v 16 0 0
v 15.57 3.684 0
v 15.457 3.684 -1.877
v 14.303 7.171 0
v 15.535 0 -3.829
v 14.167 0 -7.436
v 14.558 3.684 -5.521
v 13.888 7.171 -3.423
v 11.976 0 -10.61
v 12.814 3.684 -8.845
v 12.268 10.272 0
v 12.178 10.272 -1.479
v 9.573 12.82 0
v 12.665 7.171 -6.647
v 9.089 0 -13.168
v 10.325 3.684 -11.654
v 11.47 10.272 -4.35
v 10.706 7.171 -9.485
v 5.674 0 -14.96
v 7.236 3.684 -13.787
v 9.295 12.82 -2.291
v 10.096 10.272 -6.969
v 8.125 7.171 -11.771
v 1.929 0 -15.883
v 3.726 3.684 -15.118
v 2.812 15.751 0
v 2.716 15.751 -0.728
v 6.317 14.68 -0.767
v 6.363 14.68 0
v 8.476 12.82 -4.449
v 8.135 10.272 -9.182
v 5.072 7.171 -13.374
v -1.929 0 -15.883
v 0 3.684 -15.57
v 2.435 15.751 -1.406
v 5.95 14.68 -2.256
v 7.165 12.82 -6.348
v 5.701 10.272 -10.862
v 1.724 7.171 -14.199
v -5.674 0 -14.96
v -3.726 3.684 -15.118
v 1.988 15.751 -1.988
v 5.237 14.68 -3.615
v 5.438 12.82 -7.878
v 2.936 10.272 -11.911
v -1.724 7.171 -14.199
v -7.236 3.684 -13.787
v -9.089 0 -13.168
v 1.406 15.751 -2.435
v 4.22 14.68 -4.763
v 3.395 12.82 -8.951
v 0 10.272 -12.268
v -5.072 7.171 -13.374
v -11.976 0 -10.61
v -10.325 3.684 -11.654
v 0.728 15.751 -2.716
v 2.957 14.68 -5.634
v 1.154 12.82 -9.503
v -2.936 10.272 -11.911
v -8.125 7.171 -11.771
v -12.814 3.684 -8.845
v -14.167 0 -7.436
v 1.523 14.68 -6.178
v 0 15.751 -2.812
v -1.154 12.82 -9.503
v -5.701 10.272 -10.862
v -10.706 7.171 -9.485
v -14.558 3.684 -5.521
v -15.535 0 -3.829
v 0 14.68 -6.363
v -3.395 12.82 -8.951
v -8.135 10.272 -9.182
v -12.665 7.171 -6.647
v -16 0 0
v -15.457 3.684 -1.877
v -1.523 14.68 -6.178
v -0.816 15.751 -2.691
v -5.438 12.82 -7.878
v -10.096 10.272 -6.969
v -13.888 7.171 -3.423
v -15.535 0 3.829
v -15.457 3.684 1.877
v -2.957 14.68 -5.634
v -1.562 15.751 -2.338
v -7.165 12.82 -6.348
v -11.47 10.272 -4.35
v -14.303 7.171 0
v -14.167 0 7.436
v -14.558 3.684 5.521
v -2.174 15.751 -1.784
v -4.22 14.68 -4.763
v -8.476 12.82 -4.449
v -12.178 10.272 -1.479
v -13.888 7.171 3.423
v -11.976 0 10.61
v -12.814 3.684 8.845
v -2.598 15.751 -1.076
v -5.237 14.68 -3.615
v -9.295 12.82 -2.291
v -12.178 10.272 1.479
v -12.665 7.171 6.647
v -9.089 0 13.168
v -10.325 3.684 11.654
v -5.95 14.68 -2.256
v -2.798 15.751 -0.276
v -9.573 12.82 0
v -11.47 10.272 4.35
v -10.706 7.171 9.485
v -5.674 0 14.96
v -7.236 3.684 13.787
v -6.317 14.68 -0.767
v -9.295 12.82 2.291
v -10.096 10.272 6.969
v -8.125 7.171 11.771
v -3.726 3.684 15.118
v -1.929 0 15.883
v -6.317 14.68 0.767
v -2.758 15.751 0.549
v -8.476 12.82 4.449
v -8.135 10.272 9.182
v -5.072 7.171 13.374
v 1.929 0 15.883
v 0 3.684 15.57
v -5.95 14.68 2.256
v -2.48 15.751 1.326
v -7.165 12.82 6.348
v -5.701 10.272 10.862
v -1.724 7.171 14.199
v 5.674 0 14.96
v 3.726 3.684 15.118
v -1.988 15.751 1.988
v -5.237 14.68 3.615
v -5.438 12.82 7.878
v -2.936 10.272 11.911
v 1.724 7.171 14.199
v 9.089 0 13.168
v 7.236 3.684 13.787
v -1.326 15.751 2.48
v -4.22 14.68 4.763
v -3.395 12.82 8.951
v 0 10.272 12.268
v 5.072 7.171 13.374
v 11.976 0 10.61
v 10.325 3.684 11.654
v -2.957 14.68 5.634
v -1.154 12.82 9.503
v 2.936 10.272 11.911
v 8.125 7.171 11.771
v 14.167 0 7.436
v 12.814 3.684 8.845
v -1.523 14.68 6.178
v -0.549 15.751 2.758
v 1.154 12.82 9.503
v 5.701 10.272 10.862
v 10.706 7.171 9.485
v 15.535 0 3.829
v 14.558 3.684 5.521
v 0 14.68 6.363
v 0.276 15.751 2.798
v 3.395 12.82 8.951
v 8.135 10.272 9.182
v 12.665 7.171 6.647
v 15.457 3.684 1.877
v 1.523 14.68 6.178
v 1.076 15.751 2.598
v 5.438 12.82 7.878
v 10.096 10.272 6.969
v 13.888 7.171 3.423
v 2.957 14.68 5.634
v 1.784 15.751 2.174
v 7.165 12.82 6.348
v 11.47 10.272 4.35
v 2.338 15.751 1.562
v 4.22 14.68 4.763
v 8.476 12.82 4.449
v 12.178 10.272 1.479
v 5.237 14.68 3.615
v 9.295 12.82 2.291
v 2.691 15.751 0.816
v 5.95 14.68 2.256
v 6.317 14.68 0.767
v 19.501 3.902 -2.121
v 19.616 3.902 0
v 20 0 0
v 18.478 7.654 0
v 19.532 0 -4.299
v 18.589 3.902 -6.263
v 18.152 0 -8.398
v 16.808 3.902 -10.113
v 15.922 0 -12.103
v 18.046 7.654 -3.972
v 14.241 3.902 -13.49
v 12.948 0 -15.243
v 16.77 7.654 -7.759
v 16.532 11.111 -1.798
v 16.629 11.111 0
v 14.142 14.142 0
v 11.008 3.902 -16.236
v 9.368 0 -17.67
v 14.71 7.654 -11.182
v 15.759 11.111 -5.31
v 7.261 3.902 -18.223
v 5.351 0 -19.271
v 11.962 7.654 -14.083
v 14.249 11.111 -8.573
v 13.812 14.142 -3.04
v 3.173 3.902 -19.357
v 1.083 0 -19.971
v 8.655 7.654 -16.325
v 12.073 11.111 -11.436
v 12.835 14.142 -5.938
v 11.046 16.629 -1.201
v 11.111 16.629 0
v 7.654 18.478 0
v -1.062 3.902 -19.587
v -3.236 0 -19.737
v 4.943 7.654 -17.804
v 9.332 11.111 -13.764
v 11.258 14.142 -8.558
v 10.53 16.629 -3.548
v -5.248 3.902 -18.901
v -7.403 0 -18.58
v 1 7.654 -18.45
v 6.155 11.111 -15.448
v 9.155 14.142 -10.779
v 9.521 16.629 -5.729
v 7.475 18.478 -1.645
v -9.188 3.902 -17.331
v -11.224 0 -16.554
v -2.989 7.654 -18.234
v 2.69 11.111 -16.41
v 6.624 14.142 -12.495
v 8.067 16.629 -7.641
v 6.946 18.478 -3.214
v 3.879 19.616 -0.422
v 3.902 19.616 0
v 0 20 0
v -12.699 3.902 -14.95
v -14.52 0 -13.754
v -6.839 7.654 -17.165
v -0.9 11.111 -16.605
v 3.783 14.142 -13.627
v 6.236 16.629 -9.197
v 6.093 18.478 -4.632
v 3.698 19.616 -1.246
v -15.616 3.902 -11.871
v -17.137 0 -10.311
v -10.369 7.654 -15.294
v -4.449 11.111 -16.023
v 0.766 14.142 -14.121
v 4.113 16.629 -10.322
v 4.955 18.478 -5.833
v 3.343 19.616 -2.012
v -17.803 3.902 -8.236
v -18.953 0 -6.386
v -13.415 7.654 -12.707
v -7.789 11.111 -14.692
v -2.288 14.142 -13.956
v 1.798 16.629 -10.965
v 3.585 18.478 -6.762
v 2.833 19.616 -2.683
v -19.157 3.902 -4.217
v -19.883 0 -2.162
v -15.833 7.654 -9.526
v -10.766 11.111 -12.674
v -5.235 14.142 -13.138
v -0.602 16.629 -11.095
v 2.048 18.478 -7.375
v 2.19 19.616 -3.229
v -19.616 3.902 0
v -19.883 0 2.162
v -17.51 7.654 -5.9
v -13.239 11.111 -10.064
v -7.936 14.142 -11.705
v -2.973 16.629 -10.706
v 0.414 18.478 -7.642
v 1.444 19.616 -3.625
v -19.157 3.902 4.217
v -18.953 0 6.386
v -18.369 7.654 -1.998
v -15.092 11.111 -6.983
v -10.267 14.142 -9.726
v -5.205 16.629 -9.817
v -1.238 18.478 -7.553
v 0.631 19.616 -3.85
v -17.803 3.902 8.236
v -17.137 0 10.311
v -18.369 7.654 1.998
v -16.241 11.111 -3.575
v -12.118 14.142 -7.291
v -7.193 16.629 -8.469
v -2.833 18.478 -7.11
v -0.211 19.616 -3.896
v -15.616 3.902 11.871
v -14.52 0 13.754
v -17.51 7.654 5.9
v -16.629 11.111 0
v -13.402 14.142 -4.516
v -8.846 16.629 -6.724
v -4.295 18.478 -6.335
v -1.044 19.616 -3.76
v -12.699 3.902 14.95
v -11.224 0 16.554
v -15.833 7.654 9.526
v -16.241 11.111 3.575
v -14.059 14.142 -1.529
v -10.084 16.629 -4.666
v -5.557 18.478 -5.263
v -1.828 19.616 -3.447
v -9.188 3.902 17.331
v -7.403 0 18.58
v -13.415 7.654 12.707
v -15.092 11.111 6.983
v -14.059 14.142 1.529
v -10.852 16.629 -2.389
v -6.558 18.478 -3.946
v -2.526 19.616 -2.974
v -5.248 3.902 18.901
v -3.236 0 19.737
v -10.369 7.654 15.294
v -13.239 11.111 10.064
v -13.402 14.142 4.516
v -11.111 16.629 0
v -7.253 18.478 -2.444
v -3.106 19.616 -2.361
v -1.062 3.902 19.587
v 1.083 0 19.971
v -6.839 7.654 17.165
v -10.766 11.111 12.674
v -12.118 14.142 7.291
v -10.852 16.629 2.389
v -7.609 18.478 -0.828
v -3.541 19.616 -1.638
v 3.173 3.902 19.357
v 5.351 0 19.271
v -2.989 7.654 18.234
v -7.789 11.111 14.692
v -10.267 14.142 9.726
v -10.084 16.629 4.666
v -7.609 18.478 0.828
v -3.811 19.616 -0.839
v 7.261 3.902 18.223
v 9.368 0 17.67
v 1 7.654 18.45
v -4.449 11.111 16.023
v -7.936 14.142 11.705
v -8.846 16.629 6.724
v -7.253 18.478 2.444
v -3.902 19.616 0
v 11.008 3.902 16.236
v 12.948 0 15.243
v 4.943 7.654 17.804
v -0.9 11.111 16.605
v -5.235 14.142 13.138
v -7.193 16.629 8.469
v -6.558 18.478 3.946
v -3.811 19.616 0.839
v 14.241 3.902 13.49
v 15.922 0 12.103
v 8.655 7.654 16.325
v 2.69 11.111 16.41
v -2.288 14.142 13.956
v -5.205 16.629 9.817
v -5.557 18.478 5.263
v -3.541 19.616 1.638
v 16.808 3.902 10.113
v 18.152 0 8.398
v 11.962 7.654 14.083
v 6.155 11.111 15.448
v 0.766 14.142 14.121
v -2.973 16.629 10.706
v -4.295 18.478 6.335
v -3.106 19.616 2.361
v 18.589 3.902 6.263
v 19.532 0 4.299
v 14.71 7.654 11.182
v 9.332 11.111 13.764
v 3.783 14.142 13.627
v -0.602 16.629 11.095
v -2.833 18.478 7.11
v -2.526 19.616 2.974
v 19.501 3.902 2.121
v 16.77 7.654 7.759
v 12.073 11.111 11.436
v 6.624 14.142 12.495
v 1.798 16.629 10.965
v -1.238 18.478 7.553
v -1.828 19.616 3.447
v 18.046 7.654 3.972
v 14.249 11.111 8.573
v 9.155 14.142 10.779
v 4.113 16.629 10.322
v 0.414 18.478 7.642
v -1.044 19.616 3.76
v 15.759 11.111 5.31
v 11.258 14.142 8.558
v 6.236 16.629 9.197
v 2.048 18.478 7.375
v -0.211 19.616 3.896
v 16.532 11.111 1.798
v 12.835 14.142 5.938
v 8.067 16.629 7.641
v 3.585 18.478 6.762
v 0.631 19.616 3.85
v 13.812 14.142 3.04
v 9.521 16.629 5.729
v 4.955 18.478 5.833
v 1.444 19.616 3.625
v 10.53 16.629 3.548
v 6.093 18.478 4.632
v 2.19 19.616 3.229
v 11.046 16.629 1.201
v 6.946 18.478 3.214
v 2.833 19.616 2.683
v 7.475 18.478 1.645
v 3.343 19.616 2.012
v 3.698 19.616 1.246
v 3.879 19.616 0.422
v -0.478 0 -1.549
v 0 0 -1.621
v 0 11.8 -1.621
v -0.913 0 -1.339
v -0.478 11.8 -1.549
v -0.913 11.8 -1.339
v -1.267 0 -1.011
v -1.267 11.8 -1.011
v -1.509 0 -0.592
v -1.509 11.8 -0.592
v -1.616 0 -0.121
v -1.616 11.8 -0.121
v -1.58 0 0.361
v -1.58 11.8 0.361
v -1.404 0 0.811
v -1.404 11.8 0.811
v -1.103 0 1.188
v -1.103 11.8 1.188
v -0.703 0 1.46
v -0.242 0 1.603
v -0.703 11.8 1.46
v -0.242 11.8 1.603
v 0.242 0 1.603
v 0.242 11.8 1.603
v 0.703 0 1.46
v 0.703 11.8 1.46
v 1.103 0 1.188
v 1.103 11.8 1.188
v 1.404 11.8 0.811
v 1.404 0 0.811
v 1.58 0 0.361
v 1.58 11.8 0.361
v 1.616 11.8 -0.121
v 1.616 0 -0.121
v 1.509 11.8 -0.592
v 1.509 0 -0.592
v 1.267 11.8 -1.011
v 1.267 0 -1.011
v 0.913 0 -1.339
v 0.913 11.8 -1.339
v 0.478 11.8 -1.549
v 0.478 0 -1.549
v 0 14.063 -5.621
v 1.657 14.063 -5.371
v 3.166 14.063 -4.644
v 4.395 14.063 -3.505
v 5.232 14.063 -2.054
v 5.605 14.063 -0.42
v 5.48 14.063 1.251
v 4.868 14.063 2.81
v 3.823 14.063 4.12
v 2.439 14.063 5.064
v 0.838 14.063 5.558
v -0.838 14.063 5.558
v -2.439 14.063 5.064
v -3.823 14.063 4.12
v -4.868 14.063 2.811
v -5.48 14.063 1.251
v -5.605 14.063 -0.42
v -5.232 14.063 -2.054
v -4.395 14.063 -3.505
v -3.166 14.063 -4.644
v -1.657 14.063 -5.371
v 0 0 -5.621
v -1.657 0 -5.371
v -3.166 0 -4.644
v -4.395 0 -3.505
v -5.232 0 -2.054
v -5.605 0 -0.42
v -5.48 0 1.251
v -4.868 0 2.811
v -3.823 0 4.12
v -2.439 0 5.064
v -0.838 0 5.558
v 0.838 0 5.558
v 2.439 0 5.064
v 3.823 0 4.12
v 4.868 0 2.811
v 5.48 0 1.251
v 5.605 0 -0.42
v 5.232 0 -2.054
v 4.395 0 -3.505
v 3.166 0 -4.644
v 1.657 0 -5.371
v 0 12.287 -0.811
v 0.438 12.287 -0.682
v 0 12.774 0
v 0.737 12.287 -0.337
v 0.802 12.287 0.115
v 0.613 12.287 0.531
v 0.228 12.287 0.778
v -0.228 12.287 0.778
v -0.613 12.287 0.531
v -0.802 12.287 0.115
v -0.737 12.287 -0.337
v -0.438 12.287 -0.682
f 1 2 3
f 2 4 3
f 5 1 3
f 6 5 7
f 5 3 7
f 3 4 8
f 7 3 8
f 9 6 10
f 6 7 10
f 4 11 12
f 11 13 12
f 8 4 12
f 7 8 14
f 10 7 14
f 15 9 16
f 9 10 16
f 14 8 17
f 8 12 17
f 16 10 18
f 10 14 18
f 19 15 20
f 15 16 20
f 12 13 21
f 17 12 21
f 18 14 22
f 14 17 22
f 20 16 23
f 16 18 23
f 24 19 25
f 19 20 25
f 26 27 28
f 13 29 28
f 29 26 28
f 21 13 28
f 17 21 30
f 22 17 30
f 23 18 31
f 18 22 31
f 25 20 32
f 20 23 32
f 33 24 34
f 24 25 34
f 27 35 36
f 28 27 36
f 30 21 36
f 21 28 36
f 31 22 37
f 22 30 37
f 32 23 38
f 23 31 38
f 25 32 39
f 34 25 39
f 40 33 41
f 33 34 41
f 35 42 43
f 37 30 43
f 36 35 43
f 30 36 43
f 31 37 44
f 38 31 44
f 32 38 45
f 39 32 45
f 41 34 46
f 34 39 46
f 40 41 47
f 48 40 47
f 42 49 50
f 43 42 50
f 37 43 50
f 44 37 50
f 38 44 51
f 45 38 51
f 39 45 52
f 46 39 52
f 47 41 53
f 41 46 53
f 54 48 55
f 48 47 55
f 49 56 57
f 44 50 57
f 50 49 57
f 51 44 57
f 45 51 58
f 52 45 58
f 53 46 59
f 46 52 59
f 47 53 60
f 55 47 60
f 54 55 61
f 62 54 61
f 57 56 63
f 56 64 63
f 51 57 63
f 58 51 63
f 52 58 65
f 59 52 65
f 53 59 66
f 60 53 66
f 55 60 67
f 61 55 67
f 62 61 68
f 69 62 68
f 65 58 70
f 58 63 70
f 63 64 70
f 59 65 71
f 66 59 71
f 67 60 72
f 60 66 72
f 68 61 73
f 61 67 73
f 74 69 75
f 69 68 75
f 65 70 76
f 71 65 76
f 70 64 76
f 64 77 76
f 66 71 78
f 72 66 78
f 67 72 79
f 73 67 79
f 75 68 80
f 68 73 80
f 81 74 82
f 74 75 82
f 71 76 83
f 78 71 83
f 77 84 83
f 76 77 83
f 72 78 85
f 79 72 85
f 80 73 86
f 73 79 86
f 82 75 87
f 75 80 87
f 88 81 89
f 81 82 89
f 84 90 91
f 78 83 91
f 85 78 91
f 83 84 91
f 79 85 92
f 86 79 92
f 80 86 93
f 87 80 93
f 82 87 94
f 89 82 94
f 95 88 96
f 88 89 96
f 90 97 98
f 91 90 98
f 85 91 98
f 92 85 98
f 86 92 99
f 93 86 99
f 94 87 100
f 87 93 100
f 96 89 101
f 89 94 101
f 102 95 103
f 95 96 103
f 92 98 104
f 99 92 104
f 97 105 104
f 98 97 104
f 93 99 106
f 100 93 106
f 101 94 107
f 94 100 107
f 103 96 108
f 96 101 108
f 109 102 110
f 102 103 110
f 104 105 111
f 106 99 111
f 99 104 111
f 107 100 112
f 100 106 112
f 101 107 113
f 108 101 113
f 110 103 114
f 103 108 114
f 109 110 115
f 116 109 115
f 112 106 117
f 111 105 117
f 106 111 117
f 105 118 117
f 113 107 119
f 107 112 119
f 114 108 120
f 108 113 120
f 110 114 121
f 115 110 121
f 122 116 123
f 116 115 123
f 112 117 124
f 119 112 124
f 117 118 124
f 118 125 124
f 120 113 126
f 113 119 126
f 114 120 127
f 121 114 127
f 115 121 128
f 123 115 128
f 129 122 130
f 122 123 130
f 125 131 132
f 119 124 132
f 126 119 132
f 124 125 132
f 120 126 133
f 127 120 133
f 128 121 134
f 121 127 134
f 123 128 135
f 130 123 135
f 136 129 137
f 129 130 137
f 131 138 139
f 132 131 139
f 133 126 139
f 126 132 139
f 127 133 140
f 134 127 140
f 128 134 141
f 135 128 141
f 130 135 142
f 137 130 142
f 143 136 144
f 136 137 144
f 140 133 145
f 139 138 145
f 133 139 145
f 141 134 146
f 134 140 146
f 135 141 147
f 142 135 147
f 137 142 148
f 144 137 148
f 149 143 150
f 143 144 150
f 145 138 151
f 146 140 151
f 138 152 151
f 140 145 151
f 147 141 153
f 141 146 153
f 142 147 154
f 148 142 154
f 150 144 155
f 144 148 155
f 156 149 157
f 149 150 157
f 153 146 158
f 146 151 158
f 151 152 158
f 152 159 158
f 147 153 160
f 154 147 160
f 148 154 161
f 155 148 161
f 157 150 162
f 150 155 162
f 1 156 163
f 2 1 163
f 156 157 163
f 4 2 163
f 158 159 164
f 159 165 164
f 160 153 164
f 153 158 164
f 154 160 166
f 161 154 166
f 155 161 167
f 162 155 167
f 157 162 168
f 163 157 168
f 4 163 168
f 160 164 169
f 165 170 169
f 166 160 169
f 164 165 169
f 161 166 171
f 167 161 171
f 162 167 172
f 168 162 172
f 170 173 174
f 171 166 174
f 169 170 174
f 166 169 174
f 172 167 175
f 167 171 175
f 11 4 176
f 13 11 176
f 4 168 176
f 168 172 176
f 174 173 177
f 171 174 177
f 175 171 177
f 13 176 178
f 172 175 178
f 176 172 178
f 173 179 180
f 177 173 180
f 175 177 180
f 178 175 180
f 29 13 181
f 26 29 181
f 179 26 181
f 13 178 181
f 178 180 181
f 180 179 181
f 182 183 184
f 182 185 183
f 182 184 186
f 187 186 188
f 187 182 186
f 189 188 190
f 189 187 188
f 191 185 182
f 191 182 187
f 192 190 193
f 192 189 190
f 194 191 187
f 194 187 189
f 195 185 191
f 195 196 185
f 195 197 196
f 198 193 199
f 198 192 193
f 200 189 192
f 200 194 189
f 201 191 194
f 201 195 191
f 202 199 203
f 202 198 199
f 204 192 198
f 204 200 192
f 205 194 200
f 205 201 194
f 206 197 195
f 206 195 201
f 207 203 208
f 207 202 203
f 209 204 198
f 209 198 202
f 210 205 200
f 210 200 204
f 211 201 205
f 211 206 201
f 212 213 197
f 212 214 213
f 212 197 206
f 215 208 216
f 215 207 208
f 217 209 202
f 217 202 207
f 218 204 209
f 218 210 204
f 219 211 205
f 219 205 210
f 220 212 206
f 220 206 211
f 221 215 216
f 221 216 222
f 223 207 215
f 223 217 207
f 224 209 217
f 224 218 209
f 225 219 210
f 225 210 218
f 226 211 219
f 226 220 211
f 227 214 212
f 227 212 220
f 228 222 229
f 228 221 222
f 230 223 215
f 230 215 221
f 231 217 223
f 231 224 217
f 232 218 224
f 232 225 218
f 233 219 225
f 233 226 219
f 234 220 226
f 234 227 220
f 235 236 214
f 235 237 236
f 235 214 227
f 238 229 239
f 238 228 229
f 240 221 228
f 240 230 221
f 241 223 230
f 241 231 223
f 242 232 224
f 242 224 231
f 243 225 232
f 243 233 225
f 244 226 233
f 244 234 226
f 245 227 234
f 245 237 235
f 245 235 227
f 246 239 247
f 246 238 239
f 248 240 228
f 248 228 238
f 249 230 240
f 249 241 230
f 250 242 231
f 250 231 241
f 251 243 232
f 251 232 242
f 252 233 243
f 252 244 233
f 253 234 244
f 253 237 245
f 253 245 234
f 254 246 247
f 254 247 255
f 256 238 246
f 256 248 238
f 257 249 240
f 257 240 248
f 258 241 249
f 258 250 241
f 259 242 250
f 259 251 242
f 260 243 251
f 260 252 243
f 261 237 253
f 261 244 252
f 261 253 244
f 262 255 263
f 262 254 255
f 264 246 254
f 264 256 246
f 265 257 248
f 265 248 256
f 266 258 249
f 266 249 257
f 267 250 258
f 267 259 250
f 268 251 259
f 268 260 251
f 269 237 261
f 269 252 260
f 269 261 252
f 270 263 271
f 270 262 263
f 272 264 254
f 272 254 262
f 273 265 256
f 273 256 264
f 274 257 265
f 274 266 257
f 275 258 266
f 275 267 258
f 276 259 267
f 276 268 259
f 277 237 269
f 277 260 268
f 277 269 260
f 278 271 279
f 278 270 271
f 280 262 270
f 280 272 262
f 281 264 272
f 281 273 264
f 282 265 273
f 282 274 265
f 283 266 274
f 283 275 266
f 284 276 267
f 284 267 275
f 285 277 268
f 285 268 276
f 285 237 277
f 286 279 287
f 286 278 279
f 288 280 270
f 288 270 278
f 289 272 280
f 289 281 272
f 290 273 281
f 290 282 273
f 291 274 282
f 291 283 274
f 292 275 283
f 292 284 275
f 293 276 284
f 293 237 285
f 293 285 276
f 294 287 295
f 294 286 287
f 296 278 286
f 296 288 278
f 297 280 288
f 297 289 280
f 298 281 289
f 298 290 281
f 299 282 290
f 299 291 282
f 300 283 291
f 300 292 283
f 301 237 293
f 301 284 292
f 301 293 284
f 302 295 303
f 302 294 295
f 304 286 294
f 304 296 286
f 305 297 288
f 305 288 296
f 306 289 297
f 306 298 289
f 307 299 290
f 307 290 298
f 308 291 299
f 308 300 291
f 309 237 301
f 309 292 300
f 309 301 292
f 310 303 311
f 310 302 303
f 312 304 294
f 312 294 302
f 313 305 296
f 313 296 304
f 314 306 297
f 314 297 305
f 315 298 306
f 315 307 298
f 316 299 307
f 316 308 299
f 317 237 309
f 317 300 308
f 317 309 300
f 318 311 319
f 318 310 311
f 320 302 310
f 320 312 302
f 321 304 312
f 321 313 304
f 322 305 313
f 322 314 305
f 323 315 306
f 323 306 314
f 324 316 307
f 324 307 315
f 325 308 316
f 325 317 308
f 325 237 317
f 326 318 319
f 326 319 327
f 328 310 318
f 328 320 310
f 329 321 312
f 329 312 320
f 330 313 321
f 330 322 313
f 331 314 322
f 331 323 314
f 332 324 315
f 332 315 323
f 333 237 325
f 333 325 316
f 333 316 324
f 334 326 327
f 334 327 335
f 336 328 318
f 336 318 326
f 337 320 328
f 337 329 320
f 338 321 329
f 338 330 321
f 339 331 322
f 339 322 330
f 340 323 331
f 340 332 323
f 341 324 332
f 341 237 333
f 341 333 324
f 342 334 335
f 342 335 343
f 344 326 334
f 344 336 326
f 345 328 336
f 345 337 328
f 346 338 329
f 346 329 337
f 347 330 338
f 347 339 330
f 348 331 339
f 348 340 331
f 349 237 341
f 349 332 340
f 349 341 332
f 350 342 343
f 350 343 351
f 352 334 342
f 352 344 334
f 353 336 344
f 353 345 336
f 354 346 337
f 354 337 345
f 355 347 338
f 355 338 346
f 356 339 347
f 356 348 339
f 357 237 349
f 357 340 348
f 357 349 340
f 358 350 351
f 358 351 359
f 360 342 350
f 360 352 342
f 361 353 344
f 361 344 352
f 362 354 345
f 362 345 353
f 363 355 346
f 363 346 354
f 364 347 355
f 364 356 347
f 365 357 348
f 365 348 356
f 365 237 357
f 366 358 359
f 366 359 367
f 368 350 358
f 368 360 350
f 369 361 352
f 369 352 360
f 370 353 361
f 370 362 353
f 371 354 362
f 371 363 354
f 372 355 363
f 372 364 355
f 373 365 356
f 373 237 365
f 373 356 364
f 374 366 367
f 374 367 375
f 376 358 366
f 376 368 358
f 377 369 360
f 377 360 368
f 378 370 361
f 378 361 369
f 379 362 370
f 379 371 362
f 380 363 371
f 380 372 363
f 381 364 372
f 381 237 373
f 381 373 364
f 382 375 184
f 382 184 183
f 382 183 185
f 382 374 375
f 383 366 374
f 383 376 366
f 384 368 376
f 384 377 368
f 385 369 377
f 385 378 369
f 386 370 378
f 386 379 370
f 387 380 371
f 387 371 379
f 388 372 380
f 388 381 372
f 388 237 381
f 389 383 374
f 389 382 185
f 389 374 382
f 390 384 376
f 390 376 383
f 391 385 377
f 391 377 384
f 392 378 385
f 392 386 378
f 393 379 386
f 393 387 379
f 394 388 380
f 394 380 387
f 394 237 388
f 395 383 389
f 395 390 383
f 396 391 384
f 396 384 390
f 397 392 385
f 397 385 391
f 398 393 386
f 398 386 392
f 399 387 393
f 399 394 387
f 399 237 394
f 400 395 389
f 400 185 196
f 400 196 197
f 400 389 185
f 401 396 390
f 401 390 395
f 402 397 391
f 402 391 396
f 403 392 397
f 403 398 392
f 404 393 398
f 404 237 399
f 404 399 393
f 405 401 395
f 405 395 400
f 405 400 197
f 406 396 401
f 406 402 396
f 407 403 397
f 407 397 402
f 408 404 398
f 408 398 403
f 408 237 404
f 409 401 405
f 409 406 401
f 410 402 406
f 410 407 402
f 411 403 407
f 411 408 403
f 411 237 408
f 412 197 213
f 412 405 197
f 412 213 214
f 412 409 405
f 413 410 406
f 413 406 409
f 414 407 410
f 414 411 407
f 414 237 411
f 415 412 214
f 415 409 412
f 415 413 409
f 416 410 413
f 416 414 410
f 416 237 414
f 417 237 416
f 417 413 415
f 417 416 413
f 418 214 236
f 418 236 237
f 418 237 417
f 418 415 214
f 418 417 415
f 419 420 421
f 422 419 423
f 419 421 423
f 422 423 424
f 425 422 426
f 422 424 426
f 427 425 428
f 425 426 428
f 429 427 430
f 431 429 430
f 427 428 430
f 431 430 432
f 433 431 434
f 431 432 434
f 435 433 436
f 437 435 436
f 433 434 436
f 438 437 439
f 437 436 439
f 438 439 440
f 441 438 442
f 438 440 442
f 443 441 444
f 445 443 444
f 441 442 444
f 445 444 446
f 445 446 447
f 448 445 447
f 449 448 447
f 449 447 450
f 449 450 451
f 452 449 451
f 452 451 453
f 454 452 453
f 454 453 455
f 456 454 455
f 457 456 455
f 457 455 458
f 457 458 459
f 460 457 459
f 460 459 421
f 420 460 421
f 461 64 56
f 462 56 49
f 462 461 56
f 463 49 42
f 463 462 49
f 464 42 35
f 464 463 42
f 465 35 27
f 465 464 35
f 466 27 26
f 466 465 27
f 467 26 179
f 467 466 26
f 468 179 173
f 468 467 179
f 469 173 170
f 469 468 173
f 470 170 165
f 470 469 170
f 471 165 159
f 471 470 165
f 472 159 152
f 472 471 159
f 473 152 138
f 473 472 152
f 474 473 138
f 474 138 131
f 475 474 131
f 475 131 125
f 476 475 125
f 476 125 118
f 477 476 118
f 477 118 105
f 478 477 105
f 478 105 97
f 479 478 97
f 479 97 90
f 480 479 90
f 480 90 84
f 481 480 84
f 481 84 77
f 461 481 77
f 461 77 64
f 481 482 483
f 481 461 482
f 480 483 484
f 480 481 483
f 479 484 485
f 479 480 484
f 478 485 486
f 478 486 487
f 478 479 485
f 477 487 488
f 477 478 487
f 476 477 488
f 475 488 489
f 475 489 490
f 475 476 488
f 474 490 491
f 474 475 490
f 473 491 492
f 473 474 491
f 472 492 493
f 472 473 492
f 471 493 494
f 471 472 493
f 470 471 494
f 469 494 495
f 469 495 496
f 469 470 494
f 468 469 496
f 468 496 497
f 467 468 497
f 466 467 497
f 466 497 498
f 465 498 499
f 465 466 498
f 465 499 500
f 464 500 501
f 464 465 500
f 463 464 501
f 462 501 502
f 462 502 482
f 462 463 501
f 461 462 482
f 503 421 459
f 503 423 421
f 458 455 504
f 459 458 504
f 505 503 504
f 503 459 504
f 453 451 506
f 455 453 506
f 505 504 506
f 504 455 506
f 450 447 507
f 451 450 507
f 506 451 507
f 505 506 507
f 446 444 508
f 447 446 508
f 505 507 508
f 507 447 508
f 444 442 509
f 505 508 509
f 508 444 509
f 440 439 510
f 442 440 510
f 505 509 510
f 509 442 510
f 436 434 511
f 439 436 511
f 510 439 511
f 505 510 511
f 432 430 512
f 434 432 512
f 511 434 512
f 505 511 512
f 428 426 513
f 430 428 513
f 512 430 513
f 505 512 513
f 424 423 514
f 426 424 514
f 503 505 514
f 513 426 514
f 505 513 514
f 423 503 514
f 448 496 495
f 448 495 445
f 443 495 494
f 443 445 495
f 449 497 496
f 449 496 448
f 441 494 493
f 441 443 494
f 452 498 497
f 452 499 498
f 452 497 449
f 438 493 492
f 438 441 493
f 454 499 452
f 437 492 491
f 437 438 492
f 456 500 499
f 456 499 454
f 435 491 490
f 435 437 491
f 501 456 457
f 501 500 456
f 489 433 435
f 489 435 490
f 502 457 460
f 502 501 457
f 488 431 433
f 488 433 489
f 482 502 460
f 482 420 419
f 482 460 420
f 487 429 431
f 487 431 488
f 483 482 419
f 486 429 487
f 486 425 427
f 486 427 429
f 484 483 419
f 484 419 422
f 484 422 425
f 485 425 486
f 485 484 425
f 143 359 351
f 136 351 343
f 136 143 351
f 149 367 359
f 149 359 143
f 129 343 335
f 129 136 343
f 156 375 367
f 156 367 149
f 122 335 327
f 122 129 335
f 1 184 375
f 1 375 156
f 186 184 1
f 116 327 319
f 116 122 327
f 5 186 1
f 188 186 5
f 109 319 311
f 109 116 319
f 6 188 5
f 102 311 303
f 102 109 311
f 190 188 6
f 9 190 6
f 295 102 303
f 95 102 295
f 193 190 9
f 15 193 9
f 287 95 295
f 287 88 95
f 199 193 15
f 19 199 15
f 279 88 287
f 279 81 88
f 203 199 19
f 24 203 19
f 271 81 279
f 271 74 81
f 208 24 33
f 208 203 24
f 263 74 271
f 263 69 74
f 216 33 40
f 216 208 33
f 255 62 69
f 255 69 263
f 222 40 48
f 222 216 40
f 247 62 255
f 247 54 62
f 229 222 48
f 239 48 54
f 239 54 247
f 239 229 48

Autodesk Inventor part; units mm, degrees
ref_plane "YZ Plane" through (0, 0, 0) normal (1, 0, 0) x (0, 1, 0)
ref_plane "XZ Plane" through (0, 0, 0) normal (0, 1, 0) x (-1, 0, 0)
ref_plane "XY Plane" through (0, 0, 0) normal (0, 0, 1) x (1, 0, 0)
sketch "Sketch1" plane through (0, 0, 0) normal (0, 0, 1) x (1, 0, 0)
  line L0 (0, 0) -> (0, 20)
  line L1 (0, 0) -> (20, 0)
  arc A0 (20, 0) -> (0, 20) centre (0, 0) ccw
  line L2 (0, -4.8284) -> (0, 28.9706) projected
  dimension "d2" = 20
revolve "Revolution1" add sketch "Sketch1" angle 360 about axis through (0, -10, 0) along (0, 1, 0)
sketch "Sketch4" plane through (0, 0, 0) normal (0, -1, 0) x (1, 0, 0)
  point P0 (0, 0)
  point P1 (0, 0)
hole "Hole2" at (0, 0, 0) direction (0, 1, 0) diameter 3.242 depth 11.8 tip angle 118 thread size "M4x0.7" class "6H" standard "ANSI Metric M Profile"
shell "Shell2" thickness 4 removed faces 1 at (13.676, 0, 1.6606)
properties part number "Ball_Upper Half" material "Nylon 6/6"
